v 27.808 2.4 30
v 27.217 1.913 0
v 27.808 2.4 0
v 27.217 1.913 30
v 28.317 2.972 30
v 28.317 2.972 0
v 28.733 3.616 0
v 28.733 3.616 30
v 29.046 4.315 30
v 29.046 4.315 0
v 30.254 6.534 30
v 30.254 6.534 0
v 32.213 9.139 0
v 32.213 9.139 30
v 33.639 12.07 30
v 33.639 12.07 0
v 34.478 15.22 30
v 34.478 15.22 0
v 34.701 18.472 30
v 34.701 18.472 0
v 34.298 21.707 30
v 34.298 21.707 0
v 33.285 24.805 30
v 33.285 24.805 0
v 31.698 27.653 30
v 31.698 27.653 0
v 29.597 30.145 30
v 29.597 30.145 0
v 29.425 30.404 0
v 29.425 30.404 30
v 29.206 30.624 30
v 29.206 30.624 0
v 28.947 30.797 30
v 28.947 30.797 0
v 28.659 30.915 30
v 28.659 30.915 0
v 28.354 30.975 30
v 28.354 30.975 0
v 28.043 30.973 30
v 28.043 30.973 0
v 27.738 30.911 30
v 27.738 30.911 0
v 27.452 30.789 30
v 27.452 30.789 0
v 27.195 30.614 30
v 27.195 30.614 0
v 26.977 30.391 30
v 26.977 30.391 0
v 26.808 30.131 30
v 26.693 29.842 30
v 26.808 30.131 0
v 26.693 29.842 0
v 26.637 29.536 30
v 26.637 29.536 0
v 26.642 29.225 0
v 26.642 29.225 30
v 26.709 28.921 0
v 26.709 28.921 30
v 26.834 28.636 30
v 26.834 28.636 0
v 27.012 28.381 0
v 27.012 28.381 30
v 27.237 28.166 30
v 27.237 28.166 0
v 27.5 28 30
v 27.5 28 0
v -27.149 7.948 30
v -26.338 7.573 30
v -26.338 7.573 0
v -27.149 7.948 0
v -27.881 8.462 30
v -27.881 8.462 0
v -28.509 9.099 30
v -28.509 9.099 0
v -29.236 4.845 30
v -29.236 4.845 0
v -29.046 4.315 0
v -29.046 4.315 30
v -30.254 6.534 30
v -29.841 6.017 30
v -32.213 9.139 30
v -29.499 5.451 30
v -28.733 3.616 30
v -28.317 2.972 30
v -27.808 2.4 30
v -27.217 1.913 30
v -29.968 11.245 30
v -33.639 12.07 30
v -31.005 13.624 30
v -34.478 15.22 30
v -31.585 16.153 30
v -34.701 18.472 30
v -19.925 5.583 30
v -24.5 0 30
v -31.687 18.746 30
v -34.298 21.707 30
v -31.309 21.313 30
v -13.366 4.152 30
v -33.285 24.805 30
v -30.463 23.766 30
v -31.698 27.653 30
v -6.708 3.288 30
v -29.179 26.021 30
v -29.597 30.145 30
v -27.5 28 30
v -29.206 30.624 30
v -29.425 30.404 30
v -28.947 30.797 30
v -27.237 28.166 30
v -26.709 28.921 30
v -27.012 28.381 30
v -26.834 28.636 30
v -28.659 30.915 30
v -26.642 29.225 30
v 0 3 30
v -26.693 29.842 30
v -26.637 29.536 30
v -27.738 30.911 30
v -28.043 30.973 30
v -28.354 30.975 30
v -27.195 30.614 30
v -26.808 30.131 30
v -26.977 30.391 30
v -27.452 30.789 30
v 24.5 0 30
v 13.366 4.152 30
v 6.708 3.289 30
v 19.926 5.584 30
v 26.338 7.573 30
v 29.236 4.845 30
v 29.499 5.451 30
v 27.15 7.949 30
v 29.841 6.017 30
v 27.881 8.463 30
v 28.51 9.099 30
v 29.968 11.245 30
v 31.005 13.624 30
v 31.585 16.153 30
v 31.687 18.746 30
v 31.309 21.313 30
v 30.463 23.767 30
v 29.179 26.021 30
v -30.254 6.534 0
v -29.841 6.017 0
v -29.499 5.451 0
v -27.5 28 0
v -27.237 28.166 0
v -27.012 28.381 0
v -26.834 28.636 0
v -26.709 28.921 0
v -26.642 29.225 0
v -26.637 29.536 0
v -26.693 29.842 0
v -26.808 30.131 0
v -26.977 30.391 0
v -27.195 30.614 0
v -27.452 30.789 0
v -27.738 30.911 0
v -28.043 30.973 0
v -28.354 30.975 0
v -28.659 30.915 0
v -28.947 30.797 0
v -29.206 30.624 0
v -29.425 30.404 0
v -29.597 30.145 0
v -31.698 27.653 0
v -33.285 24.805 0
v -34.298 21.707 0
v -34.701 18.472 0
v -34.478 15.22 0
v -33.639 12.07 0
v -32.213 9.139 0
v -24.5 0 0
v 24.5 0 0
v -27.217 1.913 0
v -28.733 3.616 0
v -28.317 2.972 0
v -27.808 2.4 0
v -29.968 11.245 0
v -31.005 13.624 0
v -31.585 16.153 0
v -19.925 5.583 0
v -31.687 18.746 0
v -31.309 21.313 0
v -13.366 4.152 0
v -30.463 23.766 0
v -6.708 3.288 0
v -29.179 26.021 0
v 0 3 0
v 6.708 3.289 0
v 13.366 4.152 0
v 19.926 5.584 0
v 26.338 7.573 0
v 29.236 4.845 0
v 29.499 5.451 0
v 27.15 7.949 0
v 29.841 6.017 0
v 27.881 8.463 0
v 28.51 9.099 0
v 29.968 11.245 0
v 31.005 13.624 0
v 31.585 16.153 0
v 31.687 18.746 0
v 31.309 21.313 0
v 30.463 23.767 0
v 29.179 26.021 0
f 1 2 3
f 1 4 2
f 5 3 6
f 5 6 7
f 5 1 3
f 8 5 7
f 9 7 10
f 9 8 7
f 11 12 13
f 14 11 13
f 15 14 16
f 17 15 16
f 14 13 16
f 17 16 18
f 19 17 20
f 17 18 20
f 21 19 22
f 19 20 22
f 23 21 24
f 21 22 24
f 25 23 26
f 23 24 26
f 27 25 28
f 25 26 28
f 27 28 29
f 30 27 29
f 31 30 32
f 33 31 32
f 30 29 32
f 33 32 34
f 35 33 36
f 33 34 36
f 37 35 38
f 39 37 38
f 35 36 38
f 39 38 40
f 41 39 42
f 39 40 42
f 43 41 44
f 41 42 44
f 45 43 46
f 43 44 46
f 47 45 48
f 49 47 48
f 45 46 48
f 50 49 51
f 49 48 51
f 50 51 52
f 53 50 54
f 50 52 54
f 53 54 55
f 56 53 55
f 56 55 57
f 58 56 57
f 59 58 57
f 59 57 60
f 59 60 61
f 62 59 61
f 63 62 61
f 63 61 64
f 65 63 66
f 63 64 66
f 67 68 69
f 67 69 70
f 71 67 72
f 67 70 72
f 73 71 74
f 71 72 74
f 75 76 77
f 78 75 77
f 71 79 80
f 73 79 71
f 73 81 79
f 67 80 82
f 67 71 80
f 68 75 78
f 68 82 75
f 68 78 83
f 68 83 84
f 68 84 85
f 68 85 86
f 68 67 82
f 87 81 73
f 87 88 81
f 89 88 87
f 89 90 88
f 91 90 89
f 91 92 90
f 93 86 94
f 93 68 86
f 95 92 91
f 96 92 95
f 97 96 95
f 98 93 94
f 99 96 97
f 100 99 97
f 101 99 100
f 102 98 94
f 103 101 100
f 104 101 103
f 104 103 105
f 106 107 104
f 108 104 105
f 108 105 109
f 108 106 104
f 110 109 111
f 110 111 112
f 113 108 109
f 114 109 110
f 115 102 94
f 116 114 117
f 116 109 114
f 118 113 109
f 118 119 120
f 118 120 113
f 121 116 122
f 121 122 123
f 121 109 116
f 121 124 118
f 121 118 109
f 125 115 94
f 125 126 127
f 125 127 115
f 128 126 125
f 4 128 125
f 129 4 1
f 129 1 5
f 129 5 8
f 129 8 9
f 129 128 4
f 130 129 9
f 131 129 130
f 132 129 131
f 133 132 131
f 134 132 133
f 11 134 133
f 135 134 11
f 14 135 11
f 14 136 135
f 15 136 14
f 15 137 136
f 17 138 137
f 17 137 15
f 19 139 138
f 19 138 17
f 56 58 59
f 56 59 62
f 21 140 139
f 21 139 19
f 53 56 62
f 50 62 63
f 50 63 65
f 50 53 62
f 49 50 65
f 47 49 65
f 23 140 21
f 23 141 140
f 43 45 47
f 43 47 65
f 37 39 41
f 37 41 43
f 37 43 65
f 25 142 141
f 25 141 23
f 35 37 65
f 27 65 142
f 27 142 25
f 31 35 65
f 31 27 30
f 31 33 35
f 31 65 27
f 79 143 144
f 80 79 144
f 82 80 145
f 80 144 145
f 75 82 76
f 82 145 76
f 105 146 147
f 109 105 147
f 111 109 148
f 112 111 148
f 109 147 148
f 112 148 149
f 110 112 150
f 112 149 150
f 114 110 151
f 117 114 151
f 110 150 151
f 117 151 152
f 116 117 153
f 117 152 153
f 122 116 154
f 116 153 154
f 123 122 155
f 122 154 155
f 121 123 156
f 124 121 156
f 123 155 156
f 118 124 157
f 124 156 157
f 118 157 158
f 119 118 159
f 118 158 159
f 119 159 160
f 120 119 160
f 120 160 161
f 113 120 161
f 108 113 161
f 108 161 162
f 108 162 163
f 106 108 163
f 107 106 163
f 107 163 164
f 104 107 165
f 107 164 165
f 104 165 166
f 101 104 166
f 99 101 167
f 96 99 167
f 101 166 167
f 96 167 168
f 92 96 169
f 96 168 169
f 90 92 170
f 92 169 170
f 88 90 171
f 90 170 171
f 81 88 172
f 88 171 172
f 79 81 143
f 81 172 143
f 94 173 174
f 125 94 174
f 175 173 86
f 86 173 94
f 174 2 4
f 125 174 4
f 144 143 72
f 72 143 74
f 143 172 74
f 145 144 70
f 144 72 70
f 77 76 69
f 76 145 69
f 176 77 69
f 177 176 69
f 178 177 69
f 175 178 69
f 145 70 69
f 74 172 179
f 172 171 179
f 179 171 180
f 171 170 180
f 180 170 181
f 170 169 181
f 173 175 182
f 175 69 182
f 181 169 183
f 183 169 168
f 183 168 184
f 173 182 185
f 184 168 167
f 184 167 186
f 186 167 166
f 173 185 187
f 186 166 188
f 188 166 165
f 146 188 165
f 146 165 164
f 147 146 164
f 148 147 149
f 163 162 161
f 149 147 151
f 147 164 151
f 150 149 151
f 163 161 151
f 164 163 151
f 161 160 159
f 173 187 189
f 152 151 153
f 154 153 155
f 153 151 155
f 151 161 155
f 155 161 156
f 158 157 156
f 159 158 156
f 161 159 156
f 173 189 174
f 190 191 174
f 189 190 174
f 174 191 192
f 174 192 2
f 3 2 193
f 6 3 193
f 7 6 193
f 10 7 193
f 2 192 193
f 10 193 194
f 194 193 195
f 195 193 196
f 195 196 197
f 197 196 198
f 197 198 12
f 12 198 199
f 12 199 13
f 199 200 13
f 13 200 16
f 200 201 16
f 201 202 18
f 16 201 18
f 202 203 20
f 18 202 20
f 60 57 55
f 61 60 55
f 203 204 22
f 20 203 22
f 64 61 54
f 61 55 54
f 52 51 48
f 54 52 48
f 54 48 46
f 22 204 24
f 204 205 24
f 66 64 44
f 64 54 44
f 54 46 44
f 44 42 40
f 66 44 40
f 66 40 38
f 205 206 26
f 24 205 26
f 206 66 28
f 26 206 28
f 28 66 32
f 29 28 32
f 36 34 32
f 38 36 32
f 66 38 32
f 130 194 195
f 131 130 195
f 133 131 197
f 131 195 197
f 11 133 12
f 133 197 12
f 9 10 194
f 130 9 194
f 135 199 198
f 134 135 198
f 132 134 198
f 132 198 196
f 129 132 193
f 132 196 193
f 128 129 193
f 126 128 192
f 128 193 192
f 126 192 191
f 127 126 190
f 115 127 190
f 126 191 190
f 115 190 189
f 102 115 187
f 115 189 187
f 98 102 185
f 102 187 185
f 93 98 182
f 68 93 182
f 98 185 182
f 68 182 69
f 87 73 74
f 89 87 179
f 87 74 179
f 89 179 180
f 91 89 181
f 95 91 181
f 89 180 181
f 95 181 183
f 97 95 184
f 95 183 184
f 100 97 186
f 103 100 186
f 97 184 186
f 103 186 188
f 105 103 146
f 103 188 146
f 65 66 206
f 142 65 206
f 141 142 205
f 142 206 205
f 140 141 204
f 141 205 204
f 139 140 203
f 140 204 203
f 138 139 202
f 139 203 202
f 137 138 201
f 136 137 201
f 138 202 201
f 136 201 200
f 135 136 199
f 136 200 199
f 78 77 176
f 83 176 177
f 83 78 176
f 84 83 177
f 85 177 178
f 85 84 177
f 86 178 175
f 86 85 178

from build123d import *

# Parameters (mm, degrees)
F1_DEPTH = 30
F2_SIZE  = 3
F3_R     = 5


with BuildPart() as f1:
    # F0 (on Top) → F1 (new body)
    with BuildSketch(Plane.XY):
        with BuildLine():
            Line((-29.235905425, 4.8452048085), (-27.5, 0))
            Line((-27.5, 0), (27.5, 0))
            Line((27.5, 0), (29.235905425, 4.8452048085))
            ThreePointArc((29.235905425, 4.8452048085), (29.6607503771, 5.7400765845), (30.2536774297, 6.533629506))
            ThreePointArc((30.2536774297, 6.533629506), (34.7005588033, 18.4719723629), (29.5974730182, 30.1449025686))
            ThreePointArc((29.5974730182, 30.1449025686), (27.0806665873, 30.5080582414), (27.5, 28))
            ThreePointArc((27.5, 28), (31.6871939258, 18.746306096), (28.5098241443, 9.0991425174))
            ThreePointArc((28.5098241443, 9.0991425174), (27.527116318, 8.1895587275), (26.3382475055, 7.5734026682))
            ThreePointArc((26.3382475055, 7.5734026682), (0.0002388204, 3.0000000025), (-26.337843619, 7.5729779002))
            ThreePointArc((-26.337843619, 7.5729779002), (-27.5266380589, 8.1890555536), (-28.5093137303, 9.0985237608))
            ThreePointArc((-28.5093137303, 9.0985237608), (-31.6872153169, 18.7459056114), (-27.5, 28))
            ThreePointArc((-27.5, 28), (-27.0806665873, 30.5080582414), (-29.5974730182, 30.1449025686))
            ThreePointArc((-29.5974730182, 30.1449025686), (-34.7005588033, 18.4719723629), (-30.2536774297, 6.533629506))
            ThreePointArc((-30.2536774297, 6.533629506), (-29.6607503771, 5.7400765845), (-29.235905425, 4.8452048085))
        make_face()
    extrude(amount=F1_DEPTH)

    # F2
    f2_edges = [f1.edges().sort_by_distance(p)[0] for p in [
        (-27.5, 0, 15),
        (27.5, 0, 15),
    ]]
    chamfer(f2_edges, length=F2_SIZE)

    # F3
    f3_edges = [f1.edges().sort_by_distance(p)[0] for p in [
        (-28.511839, 2.824213, 15),
        (28.511839, 2.824213, 15),
    ]]
    fillet(f3_edges, radius=F3_R)


solid = f1.part
